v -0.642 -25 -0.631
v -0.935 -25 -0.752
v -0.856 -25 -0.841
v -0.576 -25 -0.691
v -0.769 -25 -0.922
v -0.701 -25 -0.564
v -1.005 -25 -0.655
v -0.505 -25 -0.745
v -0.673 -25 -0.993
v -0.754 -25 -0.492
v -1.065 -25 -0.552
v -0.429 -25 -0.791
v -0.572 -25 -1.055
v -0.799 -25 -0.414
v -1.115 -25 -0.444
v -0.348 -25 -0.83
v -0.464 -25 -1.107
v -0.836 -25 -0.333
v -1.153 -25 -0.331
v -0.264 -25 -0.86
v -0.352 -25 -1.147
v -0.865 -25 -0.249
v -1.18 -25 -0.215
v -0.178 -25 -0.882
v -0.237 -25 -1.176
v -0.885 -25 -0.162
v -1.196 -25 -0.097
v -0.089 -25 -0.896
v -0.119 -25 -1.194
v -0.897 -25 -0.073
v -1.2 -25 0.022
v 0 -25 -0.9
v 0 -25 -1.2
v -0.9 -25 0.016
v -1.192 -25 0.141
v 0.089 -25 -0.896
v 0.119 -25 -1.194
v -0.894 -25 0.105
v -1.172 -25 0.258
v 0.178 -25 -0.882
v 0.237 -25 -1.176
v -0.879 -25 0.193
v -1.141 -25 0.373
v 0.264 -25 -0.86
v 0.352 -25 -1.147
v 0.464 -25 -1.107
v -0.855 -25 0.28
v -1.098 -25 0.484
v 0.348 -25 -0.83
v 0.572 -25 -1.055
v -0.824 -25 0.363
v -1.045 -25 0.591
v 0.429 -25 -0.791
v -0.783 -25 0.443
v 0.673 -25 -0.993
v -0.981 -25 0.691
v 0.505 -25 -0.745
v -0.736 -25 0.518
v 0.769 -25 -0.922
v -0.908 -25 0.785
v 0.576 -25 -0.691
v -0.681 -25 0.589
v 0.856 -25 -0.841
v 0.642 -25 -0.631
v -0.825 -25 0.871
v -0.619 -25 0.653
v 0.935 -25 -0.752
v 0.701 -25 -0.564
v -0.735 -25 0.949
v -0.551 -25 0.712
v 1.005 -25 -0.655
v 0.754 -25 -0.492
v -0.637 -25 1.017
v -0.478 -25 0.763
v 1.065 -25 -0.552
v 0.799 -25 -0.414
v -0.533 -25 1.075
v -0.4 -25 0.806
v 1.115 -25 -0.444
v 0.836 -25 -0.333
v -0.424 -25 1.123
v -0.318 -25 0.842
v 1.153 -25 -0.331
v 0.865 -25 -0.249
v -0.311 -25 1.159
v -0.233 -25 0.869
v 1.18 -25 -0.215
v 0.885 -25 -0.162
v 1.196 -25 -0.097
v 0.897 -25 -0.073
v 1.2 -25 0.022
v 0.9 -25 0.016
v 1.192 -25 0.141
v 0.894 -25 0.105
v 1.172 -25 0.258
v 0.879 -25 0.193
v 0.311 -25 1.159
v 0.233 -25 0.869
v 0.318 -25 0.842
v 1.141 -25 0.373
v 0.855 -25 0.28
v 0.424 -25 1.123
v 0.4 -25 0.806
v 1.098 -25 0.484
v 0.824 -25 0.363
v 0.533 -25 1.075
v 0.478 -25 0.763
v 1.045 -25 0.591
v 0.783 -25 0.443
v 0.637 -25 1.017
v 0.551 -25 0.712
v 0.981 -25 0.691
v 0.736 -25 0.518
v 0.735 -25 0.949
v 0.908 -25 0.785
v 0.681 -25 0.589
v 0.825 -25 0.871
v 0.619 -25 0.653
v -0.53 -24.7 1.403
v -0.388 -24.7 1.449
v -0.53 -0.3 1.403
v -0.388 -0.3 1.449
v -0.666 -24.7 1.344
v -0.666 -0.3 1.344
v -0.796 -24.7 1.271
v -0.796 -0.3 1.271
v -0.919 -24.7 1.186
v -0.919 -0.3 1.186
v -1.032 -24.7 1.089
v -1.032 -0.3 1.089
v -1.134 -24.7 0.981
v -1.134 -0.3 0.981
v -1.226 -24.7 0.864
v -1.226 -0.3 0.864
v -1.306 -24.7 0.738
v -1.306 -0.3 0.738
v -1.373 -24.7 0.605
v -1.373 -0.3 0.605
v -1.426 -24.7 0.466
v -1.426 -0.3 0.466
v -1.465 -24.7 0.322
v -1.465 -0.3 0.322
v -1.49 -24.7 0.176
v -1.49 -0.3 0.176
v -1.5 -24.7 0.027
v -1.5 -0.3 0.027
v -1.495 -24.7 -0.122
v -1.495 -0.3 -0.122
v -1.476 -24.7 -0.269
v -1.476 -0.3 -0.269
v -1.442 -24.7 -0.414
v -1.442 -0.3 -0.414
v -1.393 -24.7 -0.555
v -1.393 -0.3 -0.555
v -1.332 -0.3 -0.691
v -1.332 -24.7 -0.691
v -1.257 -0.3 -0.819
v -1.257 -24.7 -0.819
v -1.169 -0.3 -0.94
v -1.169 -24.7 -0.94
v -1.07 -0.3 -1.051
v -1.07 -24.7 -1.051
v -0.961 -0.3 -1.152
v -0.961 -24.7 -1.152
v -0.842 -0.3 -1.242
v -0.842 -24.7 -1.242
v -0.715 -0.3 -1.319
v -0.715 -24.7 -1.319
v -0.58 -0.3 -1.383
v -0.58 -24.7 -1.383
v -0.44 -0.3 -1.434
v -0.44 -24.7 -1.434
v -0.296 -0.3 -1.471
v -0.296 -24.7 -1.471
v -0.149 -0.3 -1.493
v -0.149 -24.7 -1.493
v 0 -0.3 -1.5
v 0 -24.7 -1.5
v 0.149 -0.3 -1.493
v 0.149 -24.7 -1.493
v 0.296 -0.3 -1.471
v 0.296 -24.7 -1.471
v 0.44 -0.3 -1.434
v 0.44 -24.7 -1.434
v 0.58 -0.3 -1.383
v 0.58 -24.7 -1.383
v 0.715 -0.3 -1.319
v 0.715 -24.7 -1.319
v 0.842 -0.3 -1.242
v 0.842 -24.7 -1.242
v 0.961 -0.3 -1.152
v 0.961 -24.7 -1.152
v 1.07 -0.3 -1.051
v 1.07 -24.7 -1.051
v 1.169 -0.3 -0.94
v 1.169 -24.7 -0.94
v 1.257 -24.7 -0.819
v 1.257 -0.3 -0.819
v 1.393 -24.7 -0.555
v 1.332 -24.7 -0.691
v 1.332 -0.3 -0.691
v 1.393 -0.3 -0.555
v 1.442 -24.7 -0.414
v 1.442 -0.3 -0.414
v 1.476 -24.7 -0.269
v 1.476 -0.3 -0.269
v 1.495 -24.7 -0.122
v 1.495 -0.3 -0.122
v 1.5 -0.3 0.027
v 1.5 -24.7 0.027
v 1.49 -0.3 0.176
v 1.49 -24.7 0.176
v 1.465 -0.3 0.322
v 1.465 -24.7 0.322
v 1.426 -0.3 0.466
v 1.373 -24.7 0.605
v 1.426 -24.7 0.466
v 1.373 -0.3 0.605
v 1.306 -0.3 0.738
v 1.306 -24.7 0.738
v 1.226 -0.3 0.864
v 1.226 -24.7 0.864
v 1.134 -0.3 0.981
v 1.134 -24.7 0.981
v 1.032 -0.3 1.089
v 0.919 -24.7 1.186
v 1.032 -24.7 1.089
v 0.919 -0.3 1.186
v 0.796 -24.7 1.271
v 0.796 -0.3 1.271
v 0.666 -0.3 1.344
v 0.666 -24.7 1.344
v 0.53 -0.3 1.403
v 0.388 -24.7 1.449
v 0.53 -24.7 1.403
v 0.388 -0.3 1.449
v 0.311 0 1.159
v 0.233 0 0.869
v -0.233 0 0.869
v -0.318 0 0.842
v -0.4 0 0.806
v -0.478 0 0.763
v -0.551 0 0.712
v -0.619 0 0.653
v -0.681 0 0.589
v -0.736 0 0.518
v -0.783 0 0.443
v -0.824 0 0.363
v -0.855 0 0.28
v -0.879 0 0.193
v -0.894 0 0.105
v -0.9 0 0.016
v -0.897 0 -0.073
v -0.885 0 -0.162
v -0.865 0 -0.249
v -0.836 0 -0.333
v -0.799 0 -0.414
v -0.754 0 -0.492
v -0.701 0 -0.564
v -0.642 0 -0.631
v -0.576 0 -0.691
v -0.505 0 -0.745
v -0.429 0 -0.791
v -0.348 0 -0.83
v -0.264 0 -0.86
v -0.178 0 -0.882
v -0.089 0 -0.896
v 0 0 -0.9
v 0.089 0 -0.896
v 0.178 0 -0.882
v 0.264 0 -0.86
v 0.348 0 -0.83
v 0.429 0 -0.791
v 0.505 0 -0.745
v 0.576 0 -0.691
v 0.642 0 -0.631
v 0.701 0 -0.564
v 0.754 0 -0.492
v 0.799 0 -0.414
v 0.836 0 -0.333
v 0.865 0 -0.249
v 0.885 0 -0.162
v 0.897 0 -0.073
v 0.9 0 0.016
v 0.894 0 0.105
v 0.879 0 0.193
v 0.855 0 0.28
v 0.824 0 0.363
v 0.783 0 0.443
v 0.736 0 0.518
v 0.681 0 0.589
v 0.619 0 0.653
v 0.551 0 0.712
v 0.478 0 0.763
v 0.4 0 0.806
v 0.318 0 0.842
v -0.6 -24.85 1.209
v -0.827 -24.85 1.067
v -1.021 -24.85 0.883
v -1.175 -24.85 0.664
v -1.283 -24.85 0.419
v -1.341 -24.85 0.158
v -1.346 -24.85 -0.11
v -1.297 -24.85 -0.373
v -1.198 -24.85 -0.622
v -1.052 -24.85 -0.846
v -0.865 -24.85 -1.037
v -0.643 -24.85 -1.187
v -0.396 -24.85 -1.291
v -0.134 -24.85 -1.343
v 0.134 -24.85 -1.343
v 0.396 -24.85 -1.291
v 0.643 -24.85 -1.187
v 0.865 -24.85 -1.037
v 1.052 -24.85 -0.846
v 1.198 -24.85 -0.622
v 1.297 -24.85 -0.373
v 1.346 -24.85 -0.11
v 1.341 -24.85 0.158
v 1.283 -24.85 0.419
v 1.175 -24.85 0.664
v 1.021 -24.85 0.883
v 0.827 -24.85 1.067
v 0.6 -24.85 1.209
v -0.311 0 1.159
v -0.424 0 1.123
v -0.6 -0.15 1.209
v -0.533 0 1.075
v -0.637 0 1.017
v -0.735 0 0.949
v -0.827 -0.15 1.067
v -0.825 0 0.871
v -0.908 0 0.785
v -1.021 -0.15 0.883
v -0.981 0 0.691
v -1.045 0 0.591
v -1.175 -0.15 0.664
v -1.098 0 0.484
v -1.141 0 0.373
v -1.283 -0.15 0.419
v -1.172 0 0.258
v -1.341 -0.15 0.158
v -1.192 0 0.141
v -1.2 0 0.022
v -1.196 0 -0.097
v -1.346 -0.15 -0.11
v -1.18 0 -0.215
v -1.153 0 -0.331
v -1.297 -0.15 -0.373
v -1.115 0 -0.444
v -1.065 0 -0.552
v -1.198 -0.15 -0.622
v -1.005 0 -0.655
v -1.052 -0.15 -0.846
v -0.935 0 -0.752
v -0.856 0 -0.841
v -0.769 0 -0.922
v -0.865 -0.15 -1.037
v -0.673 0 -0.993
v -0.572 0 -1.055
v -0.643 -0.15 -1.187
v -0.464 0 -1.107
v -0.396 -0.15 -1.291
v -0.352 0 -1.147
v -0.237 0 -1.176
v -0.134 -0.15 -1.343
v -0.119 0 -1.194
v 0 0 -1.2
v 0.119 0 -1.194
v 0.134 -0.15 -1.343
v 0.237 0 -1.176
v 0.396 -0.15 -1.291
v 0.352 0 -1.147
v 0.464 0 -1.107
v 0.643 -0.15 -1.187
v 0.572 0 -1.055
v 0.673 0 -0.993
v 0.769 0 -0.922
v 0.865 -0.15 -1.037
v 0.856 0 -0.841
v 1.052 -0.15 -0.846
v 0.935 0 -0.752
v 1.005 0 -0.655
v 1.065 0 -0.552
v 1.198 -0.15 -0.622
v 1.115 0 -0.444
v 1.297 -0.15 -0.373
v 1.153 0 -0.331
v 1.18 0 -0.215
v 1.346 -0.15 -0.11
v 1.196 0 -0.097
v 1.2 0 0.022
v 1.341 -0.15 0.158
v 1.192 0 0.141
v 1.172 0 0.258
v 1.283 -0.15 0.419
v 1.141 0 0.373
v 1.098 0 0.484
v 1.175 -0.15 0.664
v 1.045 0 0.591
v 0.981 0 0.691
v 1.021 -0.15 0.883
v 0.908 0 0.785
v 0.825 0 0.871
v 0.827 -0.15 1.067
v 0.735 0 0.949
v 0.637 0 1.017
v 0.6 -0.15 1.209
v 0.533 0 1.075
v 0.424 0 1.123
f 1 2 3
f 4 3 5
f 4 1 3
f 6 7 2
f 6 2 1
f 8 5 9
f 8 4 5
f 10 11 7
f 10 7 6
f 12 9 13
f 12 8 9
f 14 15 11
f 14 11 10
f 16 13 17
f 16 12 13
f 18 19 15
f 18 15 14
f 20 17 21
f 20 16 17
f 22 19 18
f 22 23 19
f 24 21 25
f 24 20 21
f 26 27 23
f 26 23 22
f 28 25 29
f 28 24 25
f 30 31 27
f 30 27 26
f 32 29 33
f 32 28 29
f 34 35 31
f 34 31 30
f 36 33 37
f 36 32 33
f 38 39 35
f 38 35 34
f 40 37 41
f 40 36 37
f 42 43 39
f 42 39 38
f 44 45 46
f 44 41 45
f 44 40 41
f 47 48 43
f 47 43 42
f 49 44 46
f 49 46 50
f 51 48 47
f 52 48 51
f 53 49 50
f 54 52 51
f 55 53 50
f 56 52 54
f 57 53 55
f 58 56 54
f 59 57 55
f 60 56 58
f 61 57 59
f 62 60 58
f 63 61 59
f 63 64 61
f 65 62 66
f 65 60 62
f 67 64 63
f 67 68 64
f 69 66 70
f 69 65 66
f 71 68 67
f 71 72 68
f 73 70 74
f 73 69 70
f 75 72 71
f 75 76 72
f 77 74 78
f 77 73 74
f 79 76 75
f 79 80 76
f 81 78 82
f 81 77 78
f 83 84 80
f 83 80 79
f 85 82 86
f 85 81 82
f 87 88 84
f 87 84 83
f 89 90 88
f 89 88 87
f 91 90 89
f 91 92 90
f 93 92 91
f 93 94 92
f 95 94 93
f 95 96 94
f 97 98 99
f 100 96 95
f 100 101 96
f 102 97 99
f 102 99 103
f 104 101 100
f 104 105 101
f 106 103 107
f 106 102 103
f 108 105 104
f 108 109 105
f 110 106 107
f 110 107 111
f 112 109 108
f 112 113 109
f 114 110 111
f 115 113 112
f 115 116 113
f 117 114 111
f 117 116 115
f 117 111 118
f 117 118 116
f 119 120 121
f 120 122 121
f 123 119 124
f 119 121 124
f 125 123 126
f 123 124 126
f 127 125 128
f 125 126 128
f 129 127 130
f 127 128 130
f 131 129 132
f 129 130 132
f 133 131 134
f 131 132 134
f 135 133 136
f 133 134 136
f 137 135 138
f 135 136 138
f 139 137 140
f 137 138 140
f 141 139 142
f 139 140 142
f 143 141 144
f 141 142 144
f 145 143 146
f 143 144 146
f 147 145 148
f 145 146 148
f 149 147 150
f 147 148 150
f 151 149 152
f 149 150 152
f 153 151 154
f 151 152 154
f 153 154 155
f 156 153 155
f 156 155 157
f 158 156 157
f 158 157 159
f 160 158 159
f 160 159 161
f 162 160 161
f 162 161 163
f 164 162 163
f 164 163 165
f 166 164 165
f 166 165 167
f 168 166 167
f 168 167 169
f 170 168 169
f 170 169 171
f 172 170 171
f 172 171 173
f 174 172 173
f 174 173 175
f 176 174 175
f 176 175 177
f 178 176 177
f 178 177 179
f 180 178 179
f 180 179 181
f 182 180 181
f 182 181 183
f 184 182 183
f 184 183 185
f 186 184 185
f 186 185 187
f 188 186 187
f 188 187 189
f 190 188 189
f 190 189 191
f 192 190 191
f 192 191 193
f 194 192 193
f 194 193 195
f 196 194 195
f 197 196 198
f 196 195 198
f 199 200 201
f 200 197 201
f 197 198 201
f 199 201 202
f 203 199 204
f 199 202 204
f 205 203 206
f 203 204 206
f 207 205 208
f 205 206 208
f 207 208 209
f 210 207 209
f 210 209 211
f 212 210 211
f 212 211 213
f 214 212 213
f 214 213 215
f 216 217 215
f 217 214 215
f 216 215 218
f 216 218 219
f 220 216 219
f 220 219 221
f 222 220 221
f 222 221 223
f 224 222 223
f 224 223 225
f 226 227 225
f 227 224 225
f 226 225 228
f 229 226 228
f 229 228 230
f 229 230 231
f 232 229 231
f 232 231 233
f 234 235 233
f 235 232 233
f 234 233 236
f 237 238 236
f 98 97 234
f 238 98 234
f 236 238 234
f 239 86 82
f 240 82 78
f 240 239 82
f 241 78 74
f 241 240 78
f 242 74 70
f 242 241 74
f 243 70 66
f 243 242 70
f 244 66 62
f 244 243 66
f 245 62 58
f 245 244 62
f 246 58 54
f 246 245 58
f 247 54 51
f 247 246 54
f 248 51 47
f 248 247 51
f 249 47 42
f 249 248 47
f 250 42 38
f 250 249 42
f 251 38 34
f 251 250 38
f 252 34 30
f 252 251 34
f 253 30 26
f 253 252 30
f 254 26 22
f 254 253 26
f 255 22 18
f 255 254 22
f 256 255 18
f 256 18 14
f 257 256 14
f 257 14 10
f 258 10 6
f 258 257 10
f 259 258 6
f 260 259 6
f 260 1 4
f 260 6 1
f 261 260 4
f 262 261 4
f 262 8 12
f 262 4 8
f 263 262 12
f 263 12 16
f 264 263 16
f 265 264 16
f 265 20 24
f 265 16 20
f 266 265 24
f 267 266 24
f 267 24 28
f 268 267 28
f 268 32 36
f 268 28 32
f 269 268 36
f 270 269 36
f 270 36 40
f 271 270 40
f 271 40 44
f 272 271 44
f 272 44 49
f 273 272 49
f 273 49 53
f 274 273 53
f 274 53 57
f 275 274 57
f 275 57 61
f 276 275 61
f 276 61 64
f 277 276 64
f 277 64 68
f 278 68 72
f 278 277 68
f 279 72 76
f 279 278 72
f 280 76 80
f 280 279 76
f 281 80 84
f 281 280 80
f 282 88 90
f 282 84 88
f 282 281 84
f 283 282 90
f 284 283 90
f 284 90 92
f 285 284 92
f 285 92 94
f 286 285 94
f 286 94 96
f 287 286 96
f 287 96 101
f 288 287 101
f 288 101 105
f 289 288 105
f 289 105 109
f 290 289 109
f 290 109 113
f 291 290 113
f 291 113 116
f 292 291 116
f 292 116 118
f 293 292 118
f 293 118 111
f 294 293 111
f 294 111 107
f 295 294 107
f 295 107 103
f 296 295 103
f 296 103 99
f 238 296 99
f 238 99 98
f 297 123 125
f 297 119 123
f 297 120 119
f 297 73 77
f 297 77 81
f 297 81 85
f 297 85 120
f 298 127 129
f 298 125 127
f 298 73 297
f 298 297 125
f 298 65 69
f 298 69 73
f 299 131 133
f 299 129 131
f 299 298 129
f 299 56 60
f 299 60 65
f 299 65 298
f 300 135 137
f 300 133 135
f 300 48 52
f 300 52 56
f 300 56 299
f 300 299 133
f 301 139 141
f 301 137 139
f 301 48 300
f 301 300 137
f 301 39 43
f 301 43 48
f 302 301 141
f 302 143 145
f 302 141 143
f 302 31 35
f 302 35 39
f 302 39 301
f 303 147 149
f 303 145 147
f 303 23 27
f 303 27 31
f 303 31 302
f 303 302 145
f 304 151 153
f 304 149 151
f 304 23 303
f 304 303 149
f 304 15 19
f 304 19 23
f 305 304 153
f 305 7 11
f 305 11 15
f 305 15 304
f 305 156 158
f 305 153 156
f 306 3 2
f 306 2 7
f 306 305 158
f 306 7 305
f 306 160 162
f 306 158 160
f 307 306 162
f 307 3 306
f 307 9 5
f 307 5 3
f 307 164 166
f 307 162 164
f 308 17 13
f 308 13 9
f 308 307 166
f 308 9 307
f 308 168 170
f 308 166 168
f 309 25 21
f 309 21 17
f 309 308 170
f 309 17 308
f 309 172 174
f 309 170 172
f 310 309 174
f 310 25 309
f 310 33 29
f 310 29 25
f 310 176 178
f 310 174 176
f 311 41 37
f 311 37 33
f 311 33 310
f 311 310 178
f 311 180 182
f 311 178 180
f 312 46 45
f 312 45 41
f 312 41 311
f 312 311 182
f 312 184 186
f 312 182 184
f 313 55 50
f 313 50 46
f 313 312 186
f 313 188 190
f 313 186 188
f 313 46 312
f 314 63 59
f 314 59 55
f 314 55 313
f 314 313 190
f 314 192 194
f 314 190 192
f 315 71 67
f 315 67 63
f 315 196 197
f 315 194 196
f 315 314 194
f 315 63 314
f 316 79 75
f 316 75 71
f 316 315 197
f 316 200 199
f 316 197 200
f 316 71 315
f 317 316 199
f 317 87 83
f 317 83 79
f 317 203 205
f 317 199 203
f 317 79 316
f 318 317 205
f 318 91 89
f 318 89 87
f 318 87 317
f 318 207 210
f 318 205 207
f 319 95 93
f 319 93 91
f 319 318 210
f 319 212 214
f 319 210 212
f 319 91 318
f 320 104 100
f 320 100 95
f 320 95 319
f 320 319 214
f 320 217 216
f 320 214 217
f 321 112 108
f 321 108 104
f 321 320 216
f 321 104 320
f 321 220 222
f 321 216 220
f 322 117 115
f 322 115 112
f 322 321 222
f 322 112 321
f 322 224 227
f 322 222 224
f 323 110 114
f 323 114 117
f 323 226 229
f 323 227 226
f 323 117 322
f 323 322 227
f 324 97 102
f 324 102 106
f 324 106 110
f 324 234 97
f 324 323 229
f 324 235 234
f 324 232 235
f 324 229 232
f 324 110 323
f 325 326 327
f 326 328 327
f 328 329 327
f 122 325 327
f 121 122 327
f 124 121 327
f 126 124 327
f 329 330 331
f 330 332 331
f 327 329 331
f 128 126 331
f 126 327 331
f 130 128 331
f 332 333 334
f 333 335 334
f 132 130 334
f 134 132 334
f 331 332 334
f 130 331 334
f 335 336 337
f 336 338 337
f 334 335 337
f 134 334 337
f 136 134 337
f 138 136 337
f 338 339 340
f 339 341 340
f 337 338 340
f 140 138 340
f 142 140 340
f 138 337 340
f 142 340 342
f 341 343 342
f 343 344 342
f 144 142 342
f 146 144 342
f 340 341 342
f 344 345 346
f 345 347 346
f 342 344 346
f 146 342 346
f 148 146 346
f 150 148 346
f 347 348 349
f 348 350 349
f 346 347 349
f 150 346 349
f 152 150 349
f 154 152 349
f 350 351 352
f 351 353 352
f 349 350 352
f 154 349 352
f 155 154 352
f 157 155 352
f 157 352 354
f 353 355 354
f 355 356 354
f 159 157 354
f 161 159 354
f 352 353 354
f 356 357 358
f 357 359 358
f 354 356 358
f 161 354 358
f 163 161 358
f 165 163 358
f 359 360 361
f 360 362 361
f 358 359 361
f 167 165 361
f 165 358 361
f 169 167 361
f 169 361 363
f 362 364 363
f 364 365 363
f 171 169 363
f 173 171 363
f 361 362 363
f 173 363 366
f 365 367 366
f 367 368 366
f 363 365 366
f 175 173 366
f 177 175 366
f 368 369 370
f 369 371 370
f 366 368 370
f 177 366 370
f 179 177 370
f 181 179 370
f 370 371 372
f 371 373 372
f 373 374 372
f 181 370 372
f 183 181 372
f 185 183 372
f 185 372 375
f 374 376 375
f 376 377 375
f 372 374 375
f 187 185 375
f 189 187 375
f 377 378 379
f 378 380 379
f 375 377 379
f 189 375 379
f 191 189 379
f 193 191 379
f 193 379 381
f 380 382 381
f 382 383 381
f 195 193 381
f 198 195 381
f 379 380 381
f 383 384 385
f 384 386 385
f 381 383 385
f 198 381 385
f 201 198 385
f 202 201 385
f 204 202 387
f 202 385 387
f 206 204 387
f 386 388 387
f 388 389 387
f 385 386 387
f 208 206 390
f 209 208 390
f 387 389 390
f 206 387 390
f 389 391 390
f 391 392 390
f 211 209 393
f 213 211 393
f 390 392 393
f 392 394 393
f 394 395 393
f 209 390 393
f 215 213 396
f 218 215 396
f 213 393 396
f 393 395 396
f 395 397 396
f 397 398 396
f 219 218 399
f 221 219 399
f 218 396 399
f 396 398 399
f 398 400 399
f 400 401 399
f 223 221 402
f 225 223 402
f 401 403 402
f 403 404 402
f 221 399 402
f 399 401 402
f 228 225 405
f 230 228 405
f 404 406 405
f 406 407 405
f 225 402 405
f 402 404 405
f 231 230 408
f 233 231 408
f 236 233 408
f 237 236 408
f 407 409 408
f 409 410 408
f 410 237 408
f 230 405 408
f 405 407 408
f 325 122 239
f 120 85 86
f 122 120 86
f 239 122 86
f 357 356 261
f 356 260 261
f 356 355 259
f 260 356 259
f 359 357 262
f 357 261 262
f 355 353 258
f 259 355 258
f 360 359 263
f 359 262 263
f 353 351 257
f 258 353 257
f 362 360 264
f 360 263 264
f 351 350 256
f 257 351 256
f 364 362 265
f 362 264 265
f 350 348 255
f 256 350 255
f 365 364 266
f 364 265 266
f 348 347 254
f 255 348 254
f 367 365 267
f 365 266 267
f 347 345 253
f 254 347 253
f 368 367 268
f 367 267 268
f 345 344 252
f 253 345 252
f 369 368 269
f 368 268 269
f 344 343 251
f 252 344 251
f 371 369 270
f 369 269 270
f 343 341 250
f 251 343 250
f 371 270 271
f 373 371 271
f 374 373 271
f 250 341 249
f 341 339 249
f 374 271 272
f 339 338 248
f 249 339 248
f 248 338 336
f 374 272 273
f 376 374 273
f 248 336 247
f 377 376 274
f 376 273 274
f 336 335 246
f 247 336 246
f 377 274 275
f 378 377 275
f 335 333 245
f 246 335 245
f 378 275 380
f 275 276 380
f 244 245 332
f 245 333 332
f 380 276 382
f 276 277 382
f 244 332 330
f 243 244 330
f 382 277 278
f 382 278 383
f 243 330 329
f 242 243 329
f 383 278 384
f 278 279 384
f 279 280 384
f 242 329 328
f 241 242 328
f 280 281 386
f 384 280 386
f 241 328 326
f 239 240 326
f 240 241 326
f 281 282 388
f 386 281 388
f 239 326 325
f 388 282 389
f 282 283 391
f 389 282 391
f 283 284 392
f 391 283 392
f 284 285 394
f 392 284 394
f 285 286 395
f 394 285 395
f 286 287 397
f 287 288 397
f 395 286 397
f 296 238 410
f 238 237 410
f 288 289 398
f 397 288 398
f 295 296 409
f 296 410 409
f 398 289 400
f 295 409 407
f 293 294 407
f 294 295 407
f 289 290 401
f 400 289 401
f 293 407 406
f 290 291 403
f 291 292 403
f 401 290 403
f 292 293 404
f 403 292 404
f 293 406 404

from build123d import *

# Parameters (mm, degrees)
F0_R     = 1.5
F1_DEPTH = 25
F2_T     = -0.6
F3_SIZE  = 0.3
F4_SIZE  = 0.3
F6_DEPTH = 25.001


with BuildPart() as f1:
    # F0 (on Front) → F1 (new body)
    with BuildSketch(Plane.XZ):
        Circle(F0_R)
    extrude(amount=F1_DEPTH)

    # F2
    f2_openings = [f1.faces().sort_by_distance(p)[0] for p in [
        (0, -25, 0),
        (0, 0, 0),
    ]]
    offset(amount=F2_T, openings=f2_openings)

    # F3
    f3_edges = [f1.edges().sort_by_distance(p)[0] for p in [
        (-1.5, -25, 0),
    ]]
    chamfer(f3_edges, length=F3_SIZE)

    # F4
    f4_edges = [f1.edges().sort_by_distance(p)[0] for p in [
        (-1.5, 0, 0),
    ]]
    chamfer(f4_edges, length=F4_SIZE)

    # F5 (on face) → F6 (cut, through all)
    with BuildSketch(Plane.XZ.offset(25)):
        Polygon((-0.489606, 1.827236), (0, 0), (0.489606, 1.827236), align=None)
    extrude(amount=-F6_DEPTH, mode=Mode.SUBTRACT)


solid = f1.part
